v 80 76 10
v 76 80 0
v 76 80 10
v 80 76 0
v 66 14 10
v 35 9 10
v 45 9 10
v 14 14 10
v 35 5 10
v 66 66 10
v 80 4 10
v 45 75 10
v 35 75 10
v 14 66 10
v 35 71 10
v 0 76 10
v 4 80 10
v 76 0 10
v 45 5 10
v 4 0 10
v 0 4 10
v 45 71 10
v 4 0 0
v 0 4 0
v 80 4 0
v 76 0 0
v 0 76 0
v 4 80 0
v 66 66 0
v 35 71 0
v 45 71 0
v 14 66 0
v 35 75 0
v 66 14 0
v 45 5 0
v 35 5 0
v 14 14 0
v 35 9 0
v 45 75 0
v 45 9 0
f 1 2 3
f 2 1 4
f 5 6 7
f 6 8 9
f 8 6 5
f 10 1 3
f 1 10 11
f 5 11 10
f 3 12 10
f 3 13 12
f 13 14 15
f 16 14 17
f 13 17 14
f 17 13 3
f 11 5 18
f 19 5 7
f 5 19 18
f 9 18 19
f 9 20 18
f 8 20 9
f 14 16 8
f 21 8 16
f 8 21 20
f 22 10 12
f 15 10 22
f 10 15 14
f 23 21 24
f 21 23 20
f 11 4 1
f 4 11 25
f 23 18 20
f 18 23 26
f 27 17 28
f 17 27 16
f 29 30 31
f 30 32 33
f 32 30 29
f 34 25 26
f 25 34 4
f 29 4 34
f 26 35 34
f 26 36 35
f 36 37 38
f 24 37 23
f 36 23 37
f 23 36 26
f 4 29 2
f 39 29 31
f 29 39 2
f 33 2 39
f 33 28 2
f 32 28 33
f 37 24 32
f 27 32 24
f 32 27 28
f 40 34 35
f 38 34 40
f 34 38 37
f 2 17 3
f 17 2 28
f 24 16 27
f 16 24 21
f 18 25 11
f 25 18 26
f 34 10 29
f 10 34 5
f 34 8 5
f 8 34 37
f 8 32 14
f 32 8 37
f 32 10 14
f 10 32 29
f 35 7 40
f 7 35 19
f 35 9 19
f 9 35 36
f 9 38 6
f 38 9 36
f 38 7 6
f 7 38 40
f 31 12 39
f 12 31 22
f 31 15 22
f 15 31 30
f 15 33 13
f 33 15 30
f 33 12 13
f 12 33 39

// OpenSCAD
$fn = 32;

// ----------------------------------------------------------------------
// Frame plate: 80 x 80 frame, 14 mm rails
// ----------------------------------------------------------------------

// --- parameters (mm) ---
plate_l = 80;             // plate length, X
plate_w = 80;             // plate width, Y
plate_t = 10;             // plate thickness, Z (extrusion height)
corner_c = 4;             // corner chamfer
frame_bar = 14;           // frame rail width
slot_l = 10;              // adjustment slot length
slot_w = 4;               // adjustment slot width

win_l = plate_l - 2 * frame_bar;  // window length
win_w = plate_w - 2 * frame_bar;  // window width

profile = [[4, 0], [76, 0], [80, 4], [80, 76], [76, 80], [4, 80], [0, 76], [0, 4]];  // primary outline, 8 points, counter clockwise
void_1 = [[14, 14], [66, 14], [66, 66], [14, 66]];  // the window, 4 points
void_2 = [[35, 5], [45, 5], [45, 9], [35, 9]];  // adjustment slot, 4 points
void_3 = [[35, 71], [45, 71], [45, 75], [35, 75]];  // adjustment slot, 4 points

// --- the one profile operation ---
difference() {
  linear_extrude(height = plate_t) polygon(points = profile);
  translate([0, 0, -1])
    linear_extrude(height = plate_t + 2) polygon(points = void_1);
  translate([0, 0, -1])
    linear_extrude(height = plate_t + 2) polygon(points = void_2);
  translate([0, 0, -1])
    linear_extrude(height = plate_t + 2) polygon(points = void_3);
}
